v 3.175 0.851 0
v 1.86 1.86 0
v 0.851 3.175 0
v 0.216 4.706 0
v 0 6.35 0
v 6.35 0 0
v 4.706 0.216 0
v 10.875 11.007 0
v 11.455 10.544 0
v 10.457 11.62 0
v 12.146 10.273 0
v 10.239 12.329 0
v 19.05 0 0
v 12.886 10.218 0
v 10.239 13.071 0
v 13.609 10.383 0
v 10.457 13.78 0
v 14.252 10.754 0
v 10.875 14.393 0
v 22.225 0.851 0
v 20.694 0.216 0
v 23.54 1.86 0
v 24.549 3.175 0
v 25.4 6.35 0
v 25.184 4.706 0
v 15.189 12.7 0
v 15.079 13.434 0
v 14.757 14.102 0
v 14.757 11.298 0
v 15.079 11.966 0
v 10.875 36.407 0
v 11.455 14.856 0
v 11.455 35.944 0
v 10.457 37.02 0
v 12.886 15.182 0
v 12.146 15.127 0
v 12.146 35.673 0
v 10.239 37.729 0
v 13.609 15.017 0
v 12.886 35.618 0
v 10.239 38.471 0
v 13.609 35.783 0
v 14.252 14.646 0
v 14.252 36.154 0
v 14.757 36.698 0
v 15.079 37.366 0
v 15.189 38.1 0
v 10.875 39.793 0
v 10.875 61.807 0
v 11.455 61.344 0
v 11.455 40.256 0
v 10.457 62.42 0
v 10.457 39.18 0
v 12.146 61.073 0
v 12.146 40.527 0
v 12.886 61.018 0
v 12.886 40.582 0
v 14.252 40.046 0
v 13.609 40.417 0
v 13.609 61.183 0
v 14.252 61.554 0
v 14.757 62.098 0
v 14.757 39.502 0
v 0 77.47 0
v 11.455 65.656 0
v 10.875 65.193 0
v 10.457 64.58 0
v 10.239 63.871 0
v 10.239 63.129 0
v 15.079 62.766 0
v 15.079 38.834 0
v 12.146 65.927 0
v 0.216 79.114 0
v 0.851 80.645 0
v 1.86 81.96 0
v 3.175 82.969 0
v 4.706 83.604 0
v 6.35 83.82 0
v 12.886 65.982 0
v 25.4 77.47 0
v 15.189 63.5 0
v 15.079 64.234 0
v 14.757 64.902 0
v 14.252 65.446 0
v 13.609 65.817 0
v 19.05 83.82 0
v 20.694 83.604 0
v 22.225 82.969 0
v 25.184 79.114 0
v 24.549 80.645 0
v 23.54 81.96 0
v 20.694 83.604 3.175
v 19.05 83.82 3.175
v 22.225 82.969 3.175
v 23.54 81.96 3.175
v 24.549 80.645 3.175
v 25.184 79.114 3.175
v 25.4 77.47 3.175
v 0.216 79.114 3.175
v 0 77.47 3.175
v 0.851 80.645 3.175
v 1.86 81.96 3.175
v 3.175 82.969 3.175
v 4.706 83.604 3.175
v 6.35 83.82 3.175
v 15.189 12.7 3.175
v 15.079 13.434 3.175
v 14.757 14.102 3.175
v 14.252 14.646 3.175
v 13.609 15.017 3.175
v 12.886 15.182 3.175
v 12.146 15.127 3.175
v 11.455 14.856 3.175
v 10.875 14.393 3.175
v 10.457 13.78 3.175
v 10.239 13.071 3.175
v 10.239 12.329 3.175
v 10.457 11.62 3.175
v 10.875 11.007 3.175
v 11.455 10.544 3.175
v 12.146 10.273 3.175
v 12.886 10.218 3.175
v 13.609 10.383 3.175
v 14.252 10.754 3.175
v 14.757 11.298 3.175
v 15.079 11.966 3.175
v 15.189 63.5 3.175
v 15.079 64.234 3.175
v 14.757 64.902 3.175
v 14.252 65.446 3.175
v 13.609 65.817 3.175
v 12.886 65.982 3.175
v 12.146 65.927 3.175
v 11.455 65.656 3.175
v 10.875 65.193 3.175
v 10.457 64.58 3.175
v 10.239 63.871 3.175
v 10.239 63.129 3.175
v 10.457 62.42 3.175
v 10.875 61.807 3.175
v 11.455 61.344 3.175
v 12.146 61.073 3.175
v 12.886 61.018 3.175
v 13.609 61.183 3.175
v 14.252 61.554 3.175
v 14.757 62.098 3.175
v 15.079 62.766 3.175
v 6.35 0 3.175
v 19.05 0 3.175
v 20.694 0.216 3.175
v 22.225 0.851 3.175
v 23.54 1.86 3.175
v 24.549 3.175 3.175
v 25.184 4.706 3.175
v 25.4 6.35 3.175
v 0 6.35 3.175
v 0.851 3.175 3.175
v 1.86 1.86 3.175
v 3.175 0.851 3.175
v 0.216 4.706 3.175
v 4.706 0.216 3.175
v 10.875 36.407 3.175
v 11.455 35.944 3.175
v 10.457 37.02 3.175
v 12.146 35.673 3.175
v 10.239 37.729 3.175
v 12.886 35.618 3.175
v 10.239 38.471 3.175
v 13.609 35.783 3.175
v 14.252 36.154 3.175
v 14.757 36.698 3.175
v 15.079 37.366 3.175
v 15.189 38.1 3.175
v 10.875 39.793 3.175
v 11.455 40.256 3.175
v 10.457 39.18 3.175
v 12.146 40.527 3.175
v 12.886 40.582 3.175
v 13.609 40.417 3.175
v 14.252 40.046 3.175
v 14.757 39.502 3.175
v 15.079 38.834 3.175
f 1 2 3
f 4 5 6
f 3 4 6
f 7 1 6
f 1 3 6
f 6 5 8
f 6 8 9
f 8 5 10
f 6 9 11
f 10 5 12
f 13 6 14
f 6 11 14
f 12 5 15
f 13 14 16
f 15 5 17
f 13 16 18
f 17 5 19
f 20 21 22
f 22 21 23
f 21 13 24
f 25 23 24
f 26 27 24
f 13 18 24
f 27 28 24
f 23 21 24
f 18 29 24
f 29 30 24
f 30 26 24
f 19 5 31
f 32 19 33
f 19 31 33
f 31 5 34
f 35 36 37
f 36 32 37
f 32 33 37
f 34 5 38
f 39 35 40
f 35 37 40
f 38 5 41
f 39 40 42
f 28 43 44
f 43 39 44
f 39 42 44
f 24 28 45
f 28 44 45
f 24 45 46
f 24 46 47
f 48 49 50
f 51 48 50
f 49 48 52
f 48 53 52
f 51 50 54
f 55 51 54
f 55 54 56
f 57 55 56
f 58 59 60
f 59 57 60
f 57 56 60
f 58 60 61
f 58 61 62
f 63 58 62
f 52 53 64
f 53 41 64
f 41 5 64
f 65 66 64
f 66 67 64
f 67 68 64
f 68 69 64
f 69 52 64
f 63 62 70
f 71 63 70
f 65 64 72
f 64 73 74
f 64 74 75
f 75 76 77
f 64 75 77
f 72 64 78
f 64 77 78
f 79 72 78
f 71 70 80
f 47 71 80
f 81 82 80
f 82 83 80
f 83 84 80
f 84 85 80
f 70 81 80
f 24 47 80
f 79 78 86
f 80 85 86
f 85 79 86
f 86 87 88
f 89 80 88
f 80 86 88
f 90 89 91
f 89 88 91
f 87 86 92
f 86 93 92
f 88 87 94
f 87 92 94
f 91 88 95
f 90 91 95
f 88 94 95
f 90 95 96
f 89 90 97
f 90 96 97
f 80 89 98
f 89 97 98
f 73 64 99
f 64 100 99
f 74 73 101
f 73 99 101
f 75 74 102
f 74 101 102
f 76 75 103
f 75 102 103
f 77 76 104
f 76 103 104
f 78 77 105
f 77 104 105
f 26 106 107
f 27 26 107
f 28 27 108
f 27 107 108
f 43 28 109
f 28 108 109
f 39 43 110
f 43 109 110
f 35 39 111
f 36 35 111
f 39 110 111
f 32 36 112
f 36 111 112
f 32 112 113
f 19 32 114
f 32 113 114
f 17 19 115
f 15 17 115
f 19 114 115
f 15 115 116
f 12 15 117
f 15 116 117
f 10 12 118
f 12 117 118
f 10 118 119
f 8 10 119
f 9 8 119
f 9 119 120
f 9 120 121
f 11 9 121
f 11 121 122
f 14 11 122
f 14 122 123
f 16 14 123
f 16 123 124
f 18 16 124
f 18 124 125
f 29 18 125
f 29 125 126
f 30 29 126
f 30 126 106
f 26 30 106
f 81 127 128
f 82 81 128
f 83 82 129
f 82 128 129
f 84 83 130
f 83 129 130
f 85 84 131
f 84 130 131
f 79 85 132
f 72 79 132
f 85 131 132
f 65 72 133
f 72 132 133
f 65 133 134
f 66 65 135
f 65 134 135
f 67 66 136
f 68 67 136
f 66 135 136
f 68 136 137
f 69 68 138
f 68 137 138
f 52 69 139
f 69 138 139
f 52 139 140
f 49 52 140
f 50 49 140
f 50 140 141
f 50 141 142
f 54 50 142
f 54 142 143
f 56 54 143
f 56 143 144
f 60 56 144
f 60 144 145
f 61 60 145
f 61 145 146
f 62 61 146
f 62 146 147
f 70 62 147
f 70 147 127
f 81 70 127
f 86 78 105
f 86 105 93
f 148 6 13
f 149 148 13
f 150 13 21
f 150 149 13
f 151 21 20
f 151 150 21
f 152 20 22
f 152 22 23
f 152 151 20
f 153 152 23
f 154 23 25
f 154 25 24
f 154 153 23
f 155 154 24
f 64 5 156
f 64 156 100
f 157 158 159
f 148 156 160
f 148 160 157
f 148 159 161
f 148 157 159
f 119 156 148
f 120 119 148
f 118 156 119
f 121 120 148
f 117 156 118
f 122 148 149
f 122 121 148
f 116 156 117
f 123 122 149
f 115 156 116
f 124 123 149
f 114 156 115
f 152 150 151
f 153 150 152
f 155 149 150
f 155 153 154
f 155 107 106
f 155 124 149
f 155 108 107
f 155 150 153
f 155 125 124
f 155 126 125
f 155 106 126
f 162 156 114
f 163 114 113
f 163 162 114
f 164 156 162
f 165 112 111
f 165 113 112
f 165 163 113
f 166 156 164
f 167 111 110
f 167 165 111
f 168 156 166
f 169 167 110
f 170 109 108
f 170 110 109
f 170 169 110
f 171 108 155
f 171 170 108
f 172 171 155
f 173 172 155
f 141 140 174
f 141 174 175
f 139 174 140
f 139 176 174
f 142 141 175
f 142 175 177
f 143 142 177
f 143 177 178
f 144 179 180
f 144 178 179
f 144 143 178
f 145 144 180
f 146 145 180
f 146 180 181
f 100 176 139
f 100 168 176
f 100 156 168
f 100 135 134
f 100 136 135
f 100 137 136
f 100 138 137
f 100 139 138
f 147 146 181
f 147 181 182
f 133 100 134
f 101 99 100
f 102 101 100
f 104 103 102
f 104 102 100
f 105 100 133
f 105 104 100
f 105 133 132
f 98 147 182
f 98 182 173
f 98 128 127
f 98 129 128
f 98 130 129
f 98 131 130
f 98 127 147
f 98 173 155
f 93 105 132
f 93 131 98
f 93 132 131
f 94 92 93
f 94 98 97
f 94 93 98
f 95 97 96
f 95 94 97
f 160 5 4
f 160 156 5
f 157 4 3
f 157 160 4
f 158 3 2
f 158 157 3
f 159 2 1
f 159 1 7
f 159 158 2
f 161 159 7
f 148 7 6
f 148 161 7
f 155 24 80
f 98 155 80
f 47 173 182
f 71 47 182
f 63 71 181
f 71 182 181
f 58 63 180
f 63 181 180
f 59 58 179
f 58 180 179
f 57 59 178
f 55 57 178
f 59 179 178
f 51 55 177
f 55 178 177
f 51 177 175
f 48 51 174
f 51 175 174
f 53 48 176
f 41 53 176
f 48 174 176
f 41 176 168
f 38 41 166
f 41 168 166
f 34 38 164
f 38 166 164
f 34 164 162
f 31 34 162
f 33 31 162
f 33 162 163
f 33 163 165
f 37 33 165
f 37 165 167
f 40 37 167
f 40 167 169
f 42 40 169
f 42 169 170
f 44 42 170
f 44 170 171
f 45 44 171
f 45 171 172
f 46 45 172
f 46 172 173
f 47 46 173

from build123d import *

# Parameters (mm, degrees)
SKETCH1_W           = 25.4
SKETCH1_H           = 83.82
BOSS_EXTRUDE1_DEPTH = 3.175
SKETCH2_R           = 2.4892
CUT_EXTRUDE1_DEPTH  = 88.641502868
FILLET1_R           = 6.35


with BuildPart() as part:
    # Sketch1 → Boss-Extrude1 (new body)
    with BuildSketch(Plane.XY):
        with Locations((12.7, 41.91)):
            Rectangle(SKETCH1_W, SKETCH1_H)
    extrude(amount=BOSS_EXTRUDE1_DEPTH)

    # Sketch2 → Cut-Extrude1 (cut, through all)
    with BuildSketch(Plane.XY.offset(3.175)):
        with Locations((12.7, 12.7)):
            Circle(SKETCH2_R)
        with Locations((12.7, 38.1)):
            Circle(SKETCH2_R)
        with Locations((12.7, 63.5)):
            Circle(SKETCH2_R)
    extrude(amount=-CUT_EXTRUDE1_DEPTH, mode=Mode.SUBTRACT)

    # Fillet1
    fillet1_edges = [part.edges().sort_by_distance(p)[0] for p in [
        (0, 83.82, 1.5875),
        (25.4, 83.82, 1.5875),
        (25.4, 0, 1.5875),
        (0, 0, 1.5875),
    ]]
    fillet(fillet1_edges, radius=FILLET1_R)


solid = part.part
